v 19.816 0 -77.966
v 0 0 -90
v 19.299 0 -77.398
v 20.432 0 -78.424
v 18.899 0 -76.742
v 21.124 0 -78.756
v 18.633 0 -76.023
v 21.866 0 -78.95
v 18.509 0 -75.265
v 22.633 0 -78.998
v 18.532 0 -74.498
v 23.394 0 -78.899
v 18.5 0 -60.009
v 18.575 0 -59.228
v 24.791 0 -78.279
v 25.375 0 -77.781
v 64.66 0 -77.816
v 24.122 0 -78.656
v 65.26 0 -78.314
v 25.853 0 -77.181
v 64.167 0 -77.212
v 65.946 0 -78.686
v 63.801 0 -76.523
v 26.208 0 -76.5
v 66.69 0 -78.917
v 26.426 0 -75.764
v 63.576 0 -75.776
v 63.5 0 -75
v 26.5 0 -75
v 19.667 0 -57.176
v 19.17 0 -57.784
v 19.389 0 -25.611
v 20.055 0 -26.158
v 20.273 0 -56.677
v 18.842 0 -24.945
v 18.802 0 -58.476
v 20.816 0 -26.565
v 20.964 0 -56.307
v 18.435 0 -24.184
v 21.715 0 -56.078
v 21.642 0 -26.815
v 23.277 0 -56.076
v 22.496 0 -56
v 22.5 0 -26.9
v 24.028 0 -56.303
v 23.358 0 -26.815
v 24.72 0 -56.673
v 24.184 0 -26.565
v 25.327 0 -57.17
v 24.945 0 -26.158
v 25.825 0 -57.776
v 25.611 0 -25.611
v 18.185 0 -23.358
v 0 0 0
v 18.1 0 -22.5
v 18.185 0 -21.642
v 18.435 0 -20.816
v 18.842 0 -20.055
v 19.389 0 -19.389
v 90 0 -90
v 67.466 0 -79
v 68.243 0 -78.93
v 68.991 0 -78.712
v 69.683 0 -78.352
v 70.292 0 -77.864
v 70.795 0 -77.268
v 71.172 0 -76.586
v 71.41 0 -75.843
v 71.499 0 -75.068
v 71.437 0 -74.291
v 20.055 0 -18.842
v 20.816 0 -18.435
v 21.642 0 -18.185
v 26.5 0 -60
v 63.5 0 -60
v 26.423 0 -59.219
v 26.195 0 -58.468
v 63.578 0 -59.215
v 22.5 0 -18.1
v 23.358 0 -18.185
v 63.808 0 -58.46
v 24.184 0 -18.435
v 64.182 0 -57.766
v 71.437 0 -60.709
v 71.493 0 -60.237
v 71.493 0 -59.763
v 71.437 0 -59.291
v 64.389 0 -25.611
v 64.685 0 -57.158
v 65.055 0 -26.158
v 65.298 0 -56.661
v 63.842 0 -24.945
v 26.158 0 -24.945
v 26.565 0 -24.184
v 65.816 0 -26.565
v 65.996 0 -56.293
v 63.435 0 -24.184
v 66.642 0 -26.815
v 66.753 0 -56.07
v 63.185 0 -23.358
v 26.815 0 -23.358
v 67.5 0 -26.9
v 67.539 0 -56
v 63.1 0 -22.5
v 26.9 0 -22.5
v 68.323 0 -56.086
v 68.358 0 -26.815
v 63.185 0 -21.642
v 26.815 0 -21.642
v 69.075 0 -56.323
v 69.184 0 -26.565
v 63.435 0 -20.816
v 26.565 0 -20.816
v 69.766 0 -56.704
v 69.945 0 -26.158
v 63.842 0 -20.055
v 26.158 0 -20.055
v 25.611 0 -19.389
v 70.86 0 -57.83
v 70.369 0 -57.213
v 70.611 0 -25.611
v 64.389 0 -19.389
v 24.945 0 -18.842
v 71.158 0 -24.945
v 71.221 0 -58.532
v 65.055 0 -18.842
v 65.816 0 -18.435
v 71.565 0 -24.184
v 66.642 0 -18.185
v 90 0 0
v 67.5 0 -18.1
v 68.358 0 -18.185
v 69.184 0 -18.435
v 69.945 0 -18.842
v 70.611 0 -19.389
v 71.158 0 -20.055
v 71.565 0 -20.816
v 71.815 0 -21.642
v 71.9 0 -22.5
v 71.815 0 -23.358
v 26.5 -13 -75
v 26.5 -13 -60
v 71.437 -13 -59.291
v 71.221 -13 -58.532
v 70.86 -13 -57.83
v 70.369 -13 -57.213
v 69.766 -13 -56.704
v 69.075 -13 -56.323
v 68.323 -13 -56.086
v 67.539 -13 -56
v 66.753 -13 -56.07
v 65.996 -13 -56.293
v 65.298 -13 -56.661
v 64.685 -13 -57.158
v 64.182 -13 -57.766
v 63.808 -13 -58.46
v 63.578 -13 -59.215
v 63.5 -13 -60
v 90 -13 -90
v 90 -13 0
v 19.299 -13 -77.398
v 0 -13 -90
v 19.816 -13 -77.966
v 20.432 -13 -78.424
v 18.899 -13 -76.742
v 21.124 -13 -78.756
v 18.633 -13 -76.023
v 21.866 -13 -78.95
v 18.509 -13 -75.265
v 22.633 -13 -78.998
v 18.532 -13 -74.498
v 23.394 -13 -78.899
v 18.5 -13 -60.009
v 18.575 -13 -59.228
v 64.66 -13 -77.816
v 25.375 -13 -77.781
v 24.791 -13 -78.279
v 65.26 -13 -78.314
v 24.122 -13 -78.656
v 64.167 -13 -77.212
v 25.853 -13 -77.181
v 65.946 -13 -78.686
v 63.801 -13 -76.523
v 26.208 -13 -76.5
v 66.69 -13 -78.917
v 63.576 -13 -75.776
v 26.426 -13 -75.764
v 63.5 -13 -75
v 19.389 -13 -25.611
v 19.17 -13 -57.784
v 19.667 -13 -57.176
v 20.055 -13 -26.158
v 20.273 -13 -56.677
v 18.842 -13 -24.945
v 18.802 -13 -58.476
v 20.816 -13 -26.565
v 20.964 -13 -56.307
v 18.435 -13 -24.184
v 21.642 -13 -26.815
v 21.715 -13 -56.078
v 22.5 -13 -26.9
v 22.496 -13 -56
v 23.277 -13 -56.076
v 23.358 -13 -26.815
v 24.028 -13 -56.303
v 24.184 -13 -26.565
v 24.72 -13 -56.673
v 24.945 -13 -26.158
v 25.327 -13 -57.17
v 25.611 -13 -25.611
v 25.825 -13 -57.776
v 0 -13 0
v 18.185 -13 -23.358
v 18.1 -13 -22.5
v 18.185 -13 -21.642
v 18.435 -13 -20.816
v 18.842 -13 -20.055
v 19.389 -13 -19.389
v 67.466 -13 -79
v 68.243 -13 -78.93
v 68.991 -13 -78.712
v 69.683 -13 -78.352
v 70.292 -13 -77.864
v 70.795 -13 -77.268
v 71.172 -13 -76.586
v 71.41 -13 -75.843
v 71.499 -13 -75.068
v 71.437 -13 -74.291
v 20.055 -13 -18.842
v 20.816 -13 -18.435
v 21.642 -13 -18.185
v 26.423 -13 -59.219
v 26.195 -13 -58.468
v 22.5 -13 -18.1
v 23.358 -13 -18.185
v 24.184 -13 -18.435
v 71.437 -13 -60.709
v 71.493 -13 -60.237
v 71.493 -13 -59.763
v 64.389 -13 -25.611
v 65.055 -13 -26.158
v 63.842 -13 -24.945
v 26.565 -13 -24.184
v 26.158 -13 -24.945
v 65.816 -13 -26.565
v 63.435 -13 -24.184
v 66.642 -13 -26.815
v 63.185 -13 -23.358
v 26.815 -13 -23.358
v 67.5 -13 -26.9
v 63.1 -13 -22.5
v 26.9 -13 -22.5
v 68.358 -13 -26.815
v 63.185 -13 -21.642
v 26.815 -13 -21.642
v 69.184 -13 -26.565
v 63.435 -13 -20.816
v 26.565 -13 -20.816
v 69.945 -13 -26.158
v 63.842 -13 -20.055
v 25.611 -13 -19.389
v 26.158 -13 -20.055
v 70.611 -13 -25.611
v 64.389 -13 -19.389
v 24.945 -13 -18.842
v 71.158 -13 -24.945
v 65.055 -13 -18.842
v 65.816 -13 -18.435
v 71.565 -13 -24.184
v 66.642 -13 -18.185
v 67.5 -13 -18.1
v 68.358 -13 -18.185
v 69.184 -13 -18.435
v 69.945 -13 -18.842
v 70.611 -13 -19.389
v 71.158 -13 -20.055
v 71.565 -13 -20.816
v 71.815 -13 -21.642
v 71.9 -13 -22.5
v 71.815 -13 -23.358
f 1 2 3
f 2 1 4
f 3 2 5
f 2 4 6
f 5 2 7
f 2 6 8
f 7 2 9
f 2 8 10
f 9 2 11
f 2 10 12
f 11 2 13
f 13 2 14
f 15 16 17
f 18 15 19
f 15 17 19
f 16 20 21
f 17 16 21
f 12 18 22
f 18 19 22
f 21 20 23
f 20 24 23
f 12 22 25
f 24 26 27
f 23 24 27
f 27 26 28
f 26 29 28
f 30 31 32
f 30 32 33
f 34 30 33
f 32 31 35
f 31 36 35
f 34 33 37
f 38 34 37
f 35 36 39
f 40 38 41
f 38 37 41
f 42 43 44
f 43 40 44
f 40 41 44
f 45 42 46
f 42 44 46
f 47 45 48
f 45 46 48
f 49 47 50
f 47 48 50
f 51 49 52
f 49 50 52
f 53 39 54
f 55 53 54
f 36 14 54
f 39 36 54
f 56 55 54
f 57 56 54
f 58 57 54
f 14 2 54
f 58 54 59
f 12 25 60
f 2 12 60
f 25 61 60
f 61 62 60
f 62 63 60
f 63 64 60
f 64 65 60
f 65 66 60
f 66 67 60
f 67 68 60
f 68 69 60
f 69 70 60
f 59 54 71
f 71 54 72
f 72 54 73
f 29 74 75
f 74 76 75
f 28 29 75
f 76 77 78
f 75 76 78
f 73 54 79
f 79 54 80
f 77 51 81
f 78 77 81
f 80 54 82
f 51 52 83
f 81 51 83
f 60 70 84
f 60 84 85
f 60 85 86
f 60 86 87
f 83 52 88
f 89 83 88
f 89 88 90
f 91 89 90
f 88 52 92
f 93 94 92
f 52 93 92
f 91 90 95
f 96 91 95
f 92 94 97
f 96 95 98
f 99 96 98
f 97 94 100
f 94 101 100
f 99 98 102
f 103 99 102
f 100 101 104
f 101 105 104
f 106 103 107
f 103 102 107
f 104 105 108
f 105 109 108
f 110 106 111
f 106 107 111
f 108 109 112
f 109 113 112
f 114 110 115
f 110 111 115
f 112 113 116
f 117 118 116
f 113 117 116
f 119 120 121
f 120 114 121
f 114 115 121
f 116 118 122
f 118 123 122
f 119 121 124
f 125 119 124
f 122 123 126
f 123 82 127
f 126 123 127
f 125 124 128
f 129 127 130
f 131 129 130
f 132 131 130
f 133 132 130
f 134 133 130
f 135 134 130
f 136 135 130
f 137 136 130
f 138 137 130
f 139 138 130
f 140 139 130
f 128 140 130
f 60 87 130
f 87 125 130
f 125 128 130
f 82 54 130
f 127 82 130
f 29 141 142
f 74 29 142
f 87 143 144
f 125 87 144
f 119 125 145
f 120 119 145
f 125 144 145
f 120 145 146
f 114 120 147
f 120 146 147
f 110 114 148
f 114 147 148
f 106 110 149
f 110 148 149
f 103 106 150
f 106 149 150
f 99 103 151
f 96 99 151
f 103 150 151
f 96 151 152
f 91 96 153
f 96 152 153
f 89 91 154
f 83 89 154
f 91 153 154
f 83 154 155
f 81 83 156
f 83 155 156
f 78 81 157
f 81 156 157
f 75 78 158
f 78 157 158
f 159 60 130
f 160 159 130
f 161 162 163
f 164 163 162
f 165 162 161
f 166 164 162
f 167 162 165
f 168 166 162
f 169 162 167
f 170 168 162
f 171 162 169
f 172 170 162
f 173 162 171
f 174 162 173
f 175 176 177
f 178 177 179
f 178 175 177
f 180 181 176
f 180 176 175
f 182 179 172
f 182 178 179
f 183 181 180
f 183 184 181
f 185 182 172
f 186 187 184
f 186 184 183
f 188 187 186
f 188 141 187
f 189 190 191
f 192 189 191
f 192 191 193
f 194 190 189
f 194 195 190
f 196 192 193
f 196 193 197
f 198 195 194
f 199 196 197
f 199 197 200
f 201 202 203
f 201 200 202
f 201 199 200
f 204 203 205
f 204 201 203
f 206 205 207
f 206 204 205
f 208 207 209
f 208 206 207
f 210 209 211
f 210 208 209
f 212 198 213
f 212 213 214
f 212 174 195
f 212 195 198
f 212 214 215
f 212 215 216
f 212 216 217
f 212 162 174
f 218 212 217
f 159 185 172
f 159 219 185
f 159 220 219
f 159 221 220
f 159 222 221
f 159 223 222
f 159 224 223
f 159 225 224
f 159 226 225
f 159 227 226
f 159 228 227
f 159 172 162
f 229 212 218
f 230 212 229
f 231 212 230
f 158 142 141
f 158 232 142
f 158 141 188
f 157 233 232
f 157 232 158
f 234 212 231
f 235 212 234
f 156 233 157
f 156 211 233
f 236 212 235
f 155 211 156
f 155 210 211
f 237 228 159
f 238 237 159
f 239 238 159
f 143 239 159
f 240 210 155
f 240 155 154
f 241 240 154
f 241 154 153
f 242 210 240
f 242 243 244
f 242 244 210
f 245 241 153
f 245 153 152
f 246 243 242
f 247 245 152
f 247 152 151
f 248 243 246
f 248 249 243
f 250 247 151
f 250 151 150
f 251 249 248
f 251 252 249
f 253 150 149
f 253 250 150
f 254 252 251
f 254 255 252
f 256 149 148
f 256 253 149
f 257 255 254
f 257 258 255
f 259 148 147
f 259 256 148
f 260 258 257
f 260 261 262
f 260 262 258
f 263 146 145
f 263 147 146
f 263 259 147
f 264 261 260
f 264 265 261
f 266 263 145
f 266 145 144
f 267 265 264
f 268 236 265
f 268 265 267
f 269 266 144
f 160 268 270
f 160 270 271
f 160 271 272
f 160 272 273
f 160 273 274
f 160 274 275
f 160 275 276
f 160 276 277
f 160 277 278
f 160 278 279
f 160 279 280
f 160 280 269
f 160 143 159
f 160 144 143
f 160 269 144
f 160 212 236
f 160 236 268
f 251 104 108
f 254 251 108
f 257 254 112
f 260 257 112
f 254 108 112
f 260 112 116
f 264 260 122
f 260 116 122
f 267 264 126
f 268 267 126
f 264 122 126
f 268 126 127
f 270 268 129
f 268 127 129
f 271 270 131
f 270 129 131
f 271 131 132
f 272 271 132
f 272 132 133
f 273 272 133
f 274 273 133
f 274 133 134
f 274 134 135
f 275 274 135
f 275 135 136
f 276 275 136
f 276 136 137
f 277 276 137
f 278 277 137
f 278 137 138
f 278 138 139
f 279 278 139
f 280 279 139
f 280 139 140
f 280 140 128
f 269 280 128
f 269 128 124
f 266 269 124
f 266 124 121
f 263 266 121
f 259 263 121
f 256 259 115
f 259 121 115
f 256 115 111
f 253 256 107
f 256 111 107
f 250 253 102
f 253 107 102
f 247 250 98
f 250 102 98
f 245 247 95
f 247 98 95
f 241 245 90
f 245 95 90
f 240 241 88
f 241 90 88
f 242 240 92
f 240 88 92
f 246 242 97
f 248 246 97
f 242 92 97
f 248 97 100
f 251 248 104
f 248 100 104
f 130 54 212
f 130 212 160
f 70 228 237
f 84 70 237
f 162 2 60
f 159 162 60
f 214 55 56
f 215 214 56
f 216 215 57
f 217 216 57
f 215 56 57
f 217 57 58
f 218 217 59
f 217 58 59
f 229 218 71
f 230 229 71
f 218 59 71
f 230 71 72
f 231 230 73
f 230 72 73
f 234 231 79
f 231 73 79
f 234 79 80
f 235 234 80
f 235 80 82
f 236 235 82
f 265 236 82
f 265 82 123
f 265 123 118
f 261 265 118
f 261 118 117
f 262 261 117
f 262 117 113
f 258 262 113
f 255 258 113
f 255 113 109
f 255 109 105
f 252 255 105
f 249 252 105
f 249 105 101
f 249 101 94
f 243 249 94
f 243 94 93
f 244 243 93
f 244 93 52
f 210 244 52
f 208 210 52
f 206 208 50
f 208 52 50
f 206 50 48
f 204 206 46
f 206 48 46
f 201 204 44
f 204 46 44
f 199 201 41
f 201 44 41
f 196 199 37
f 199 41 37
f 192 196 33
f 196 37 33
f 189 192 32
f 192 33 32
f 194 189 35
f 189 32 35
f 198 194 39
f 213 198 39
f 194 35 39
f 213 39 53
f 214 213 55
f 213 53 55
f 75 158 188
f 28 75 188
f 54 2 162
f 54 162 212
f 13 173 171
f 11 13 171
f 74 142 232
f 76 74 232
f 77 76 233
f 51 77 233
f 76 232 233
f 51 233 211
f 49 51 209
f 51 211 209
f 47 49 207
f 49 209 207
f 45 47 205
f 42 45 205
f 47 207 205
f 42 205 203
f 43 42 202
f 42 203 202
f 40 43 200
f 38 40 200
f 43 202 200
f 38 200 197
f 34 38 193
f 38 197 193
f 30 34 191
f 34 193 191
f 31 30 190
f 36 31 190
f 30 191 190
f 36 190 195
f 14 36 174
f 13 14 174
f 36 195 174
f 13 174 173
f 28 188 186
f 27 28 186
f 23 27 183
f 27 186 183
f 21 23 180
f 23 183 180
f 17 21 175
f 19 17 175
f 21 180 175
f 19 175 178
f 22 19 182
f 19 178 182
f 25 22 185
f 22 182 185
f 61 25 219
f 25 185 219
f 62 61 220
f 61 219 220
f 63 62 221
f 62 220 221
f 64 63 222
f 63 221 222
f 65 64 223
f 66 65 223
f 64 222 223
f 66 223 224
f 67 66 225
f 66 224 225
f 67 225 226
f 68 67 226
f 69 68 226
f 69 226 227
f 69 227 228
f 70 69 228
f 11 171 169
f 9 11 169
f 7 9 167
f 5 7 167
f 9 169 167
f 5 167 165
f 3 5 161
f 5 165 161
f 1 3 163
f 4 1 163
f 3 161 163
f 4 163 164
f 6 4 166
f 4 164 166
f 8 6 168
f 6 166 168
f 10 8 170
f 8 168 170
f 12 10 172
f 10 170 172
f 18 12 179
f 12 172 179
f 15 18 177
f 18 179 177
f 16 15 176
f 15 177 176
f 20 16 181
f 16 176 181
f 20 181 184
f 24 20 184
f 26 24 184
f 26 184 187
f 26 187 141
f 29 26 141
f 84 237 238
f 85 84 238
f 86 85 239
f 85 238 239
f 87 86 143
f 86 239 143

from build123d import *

# Parameters (mm, degrees)
F0_W     = 90
F0_H     = 90
F1_DEPTH = 13
F3_DEPTH = 25
F4_D     = 8.8
F4_DEPTH = 18.25
F4_TIP   = 2.6437867237


with BuildPart() as f1:
    # F0 (on Front) → F1 (new body)
    with BuildSketch(Plane.XZ):
        with Locations((45, -45)):
            Rectangle(F0_W, F0_H)
    extrude(amount=F1_DEPTH)

    # F2 (on face) → F3 (cut)
    with BuildSketch(Plane.XZ.offset(13)):
        with BuildLine():
            Line((71.4366715828, -59.2910452421), (71.4366715828, -60.7089547579))
            ThreePointArc((71.4366715828, -60.7089547579), (71.5, -60), (71.4366715828, -59.2910452421))
        make_face()
        with BuildLine():
            Line((71.4366715828, -74.2910452421), (71.4366715828, -60.7089547579))
            Line((71.4366715828, -60.7089547579), (71.4366715828, -59.2910452421))
            ThreePointArc((71.4366715828, -59.2910452421), (67.1441112051, -56.0158635609), (63.5, -60))
            Line((63.5, -60), (63.5, -75))
            ThreePointArc((63.5, -75), (67.8558887949, -78.9841364391), (71.4366715828, -74.2910452421))
        make_face()
        with BuildLine():
            Line((26.5, -75), (26.5, -60))
            ThreePointArc((26.5, -60), (22.4956317773, -56.0000023852), (18.5000095407, -60.0087364402))
            Line((18.5000095407, -60.0087364402), (18.5316552492, -74.4977650565))
            ThreePointArc((18.5316552492, -74.4977650565), (22.2483842248, -78.9920783436), (26.5, -75))
        make_face()
    extrude(amount=-F3_DEPTH, mode=Mode.SUBTRACT)

    # F4
    with Locations(Plane.XZ.offset(13)):
        with Locations((22.5, -22.5), (67.5, -22.5)):
            Hole(F4_D / 2, depth=F4_DEPTH)
            with Locations((0, 0, -(F4_DEPTH + F4_TIP / 2))):  # 118° drill point
                Cone(0, F4_D / 2, F4_TIP, mode=Mode.SUBTRACT)


solid = f1.part
